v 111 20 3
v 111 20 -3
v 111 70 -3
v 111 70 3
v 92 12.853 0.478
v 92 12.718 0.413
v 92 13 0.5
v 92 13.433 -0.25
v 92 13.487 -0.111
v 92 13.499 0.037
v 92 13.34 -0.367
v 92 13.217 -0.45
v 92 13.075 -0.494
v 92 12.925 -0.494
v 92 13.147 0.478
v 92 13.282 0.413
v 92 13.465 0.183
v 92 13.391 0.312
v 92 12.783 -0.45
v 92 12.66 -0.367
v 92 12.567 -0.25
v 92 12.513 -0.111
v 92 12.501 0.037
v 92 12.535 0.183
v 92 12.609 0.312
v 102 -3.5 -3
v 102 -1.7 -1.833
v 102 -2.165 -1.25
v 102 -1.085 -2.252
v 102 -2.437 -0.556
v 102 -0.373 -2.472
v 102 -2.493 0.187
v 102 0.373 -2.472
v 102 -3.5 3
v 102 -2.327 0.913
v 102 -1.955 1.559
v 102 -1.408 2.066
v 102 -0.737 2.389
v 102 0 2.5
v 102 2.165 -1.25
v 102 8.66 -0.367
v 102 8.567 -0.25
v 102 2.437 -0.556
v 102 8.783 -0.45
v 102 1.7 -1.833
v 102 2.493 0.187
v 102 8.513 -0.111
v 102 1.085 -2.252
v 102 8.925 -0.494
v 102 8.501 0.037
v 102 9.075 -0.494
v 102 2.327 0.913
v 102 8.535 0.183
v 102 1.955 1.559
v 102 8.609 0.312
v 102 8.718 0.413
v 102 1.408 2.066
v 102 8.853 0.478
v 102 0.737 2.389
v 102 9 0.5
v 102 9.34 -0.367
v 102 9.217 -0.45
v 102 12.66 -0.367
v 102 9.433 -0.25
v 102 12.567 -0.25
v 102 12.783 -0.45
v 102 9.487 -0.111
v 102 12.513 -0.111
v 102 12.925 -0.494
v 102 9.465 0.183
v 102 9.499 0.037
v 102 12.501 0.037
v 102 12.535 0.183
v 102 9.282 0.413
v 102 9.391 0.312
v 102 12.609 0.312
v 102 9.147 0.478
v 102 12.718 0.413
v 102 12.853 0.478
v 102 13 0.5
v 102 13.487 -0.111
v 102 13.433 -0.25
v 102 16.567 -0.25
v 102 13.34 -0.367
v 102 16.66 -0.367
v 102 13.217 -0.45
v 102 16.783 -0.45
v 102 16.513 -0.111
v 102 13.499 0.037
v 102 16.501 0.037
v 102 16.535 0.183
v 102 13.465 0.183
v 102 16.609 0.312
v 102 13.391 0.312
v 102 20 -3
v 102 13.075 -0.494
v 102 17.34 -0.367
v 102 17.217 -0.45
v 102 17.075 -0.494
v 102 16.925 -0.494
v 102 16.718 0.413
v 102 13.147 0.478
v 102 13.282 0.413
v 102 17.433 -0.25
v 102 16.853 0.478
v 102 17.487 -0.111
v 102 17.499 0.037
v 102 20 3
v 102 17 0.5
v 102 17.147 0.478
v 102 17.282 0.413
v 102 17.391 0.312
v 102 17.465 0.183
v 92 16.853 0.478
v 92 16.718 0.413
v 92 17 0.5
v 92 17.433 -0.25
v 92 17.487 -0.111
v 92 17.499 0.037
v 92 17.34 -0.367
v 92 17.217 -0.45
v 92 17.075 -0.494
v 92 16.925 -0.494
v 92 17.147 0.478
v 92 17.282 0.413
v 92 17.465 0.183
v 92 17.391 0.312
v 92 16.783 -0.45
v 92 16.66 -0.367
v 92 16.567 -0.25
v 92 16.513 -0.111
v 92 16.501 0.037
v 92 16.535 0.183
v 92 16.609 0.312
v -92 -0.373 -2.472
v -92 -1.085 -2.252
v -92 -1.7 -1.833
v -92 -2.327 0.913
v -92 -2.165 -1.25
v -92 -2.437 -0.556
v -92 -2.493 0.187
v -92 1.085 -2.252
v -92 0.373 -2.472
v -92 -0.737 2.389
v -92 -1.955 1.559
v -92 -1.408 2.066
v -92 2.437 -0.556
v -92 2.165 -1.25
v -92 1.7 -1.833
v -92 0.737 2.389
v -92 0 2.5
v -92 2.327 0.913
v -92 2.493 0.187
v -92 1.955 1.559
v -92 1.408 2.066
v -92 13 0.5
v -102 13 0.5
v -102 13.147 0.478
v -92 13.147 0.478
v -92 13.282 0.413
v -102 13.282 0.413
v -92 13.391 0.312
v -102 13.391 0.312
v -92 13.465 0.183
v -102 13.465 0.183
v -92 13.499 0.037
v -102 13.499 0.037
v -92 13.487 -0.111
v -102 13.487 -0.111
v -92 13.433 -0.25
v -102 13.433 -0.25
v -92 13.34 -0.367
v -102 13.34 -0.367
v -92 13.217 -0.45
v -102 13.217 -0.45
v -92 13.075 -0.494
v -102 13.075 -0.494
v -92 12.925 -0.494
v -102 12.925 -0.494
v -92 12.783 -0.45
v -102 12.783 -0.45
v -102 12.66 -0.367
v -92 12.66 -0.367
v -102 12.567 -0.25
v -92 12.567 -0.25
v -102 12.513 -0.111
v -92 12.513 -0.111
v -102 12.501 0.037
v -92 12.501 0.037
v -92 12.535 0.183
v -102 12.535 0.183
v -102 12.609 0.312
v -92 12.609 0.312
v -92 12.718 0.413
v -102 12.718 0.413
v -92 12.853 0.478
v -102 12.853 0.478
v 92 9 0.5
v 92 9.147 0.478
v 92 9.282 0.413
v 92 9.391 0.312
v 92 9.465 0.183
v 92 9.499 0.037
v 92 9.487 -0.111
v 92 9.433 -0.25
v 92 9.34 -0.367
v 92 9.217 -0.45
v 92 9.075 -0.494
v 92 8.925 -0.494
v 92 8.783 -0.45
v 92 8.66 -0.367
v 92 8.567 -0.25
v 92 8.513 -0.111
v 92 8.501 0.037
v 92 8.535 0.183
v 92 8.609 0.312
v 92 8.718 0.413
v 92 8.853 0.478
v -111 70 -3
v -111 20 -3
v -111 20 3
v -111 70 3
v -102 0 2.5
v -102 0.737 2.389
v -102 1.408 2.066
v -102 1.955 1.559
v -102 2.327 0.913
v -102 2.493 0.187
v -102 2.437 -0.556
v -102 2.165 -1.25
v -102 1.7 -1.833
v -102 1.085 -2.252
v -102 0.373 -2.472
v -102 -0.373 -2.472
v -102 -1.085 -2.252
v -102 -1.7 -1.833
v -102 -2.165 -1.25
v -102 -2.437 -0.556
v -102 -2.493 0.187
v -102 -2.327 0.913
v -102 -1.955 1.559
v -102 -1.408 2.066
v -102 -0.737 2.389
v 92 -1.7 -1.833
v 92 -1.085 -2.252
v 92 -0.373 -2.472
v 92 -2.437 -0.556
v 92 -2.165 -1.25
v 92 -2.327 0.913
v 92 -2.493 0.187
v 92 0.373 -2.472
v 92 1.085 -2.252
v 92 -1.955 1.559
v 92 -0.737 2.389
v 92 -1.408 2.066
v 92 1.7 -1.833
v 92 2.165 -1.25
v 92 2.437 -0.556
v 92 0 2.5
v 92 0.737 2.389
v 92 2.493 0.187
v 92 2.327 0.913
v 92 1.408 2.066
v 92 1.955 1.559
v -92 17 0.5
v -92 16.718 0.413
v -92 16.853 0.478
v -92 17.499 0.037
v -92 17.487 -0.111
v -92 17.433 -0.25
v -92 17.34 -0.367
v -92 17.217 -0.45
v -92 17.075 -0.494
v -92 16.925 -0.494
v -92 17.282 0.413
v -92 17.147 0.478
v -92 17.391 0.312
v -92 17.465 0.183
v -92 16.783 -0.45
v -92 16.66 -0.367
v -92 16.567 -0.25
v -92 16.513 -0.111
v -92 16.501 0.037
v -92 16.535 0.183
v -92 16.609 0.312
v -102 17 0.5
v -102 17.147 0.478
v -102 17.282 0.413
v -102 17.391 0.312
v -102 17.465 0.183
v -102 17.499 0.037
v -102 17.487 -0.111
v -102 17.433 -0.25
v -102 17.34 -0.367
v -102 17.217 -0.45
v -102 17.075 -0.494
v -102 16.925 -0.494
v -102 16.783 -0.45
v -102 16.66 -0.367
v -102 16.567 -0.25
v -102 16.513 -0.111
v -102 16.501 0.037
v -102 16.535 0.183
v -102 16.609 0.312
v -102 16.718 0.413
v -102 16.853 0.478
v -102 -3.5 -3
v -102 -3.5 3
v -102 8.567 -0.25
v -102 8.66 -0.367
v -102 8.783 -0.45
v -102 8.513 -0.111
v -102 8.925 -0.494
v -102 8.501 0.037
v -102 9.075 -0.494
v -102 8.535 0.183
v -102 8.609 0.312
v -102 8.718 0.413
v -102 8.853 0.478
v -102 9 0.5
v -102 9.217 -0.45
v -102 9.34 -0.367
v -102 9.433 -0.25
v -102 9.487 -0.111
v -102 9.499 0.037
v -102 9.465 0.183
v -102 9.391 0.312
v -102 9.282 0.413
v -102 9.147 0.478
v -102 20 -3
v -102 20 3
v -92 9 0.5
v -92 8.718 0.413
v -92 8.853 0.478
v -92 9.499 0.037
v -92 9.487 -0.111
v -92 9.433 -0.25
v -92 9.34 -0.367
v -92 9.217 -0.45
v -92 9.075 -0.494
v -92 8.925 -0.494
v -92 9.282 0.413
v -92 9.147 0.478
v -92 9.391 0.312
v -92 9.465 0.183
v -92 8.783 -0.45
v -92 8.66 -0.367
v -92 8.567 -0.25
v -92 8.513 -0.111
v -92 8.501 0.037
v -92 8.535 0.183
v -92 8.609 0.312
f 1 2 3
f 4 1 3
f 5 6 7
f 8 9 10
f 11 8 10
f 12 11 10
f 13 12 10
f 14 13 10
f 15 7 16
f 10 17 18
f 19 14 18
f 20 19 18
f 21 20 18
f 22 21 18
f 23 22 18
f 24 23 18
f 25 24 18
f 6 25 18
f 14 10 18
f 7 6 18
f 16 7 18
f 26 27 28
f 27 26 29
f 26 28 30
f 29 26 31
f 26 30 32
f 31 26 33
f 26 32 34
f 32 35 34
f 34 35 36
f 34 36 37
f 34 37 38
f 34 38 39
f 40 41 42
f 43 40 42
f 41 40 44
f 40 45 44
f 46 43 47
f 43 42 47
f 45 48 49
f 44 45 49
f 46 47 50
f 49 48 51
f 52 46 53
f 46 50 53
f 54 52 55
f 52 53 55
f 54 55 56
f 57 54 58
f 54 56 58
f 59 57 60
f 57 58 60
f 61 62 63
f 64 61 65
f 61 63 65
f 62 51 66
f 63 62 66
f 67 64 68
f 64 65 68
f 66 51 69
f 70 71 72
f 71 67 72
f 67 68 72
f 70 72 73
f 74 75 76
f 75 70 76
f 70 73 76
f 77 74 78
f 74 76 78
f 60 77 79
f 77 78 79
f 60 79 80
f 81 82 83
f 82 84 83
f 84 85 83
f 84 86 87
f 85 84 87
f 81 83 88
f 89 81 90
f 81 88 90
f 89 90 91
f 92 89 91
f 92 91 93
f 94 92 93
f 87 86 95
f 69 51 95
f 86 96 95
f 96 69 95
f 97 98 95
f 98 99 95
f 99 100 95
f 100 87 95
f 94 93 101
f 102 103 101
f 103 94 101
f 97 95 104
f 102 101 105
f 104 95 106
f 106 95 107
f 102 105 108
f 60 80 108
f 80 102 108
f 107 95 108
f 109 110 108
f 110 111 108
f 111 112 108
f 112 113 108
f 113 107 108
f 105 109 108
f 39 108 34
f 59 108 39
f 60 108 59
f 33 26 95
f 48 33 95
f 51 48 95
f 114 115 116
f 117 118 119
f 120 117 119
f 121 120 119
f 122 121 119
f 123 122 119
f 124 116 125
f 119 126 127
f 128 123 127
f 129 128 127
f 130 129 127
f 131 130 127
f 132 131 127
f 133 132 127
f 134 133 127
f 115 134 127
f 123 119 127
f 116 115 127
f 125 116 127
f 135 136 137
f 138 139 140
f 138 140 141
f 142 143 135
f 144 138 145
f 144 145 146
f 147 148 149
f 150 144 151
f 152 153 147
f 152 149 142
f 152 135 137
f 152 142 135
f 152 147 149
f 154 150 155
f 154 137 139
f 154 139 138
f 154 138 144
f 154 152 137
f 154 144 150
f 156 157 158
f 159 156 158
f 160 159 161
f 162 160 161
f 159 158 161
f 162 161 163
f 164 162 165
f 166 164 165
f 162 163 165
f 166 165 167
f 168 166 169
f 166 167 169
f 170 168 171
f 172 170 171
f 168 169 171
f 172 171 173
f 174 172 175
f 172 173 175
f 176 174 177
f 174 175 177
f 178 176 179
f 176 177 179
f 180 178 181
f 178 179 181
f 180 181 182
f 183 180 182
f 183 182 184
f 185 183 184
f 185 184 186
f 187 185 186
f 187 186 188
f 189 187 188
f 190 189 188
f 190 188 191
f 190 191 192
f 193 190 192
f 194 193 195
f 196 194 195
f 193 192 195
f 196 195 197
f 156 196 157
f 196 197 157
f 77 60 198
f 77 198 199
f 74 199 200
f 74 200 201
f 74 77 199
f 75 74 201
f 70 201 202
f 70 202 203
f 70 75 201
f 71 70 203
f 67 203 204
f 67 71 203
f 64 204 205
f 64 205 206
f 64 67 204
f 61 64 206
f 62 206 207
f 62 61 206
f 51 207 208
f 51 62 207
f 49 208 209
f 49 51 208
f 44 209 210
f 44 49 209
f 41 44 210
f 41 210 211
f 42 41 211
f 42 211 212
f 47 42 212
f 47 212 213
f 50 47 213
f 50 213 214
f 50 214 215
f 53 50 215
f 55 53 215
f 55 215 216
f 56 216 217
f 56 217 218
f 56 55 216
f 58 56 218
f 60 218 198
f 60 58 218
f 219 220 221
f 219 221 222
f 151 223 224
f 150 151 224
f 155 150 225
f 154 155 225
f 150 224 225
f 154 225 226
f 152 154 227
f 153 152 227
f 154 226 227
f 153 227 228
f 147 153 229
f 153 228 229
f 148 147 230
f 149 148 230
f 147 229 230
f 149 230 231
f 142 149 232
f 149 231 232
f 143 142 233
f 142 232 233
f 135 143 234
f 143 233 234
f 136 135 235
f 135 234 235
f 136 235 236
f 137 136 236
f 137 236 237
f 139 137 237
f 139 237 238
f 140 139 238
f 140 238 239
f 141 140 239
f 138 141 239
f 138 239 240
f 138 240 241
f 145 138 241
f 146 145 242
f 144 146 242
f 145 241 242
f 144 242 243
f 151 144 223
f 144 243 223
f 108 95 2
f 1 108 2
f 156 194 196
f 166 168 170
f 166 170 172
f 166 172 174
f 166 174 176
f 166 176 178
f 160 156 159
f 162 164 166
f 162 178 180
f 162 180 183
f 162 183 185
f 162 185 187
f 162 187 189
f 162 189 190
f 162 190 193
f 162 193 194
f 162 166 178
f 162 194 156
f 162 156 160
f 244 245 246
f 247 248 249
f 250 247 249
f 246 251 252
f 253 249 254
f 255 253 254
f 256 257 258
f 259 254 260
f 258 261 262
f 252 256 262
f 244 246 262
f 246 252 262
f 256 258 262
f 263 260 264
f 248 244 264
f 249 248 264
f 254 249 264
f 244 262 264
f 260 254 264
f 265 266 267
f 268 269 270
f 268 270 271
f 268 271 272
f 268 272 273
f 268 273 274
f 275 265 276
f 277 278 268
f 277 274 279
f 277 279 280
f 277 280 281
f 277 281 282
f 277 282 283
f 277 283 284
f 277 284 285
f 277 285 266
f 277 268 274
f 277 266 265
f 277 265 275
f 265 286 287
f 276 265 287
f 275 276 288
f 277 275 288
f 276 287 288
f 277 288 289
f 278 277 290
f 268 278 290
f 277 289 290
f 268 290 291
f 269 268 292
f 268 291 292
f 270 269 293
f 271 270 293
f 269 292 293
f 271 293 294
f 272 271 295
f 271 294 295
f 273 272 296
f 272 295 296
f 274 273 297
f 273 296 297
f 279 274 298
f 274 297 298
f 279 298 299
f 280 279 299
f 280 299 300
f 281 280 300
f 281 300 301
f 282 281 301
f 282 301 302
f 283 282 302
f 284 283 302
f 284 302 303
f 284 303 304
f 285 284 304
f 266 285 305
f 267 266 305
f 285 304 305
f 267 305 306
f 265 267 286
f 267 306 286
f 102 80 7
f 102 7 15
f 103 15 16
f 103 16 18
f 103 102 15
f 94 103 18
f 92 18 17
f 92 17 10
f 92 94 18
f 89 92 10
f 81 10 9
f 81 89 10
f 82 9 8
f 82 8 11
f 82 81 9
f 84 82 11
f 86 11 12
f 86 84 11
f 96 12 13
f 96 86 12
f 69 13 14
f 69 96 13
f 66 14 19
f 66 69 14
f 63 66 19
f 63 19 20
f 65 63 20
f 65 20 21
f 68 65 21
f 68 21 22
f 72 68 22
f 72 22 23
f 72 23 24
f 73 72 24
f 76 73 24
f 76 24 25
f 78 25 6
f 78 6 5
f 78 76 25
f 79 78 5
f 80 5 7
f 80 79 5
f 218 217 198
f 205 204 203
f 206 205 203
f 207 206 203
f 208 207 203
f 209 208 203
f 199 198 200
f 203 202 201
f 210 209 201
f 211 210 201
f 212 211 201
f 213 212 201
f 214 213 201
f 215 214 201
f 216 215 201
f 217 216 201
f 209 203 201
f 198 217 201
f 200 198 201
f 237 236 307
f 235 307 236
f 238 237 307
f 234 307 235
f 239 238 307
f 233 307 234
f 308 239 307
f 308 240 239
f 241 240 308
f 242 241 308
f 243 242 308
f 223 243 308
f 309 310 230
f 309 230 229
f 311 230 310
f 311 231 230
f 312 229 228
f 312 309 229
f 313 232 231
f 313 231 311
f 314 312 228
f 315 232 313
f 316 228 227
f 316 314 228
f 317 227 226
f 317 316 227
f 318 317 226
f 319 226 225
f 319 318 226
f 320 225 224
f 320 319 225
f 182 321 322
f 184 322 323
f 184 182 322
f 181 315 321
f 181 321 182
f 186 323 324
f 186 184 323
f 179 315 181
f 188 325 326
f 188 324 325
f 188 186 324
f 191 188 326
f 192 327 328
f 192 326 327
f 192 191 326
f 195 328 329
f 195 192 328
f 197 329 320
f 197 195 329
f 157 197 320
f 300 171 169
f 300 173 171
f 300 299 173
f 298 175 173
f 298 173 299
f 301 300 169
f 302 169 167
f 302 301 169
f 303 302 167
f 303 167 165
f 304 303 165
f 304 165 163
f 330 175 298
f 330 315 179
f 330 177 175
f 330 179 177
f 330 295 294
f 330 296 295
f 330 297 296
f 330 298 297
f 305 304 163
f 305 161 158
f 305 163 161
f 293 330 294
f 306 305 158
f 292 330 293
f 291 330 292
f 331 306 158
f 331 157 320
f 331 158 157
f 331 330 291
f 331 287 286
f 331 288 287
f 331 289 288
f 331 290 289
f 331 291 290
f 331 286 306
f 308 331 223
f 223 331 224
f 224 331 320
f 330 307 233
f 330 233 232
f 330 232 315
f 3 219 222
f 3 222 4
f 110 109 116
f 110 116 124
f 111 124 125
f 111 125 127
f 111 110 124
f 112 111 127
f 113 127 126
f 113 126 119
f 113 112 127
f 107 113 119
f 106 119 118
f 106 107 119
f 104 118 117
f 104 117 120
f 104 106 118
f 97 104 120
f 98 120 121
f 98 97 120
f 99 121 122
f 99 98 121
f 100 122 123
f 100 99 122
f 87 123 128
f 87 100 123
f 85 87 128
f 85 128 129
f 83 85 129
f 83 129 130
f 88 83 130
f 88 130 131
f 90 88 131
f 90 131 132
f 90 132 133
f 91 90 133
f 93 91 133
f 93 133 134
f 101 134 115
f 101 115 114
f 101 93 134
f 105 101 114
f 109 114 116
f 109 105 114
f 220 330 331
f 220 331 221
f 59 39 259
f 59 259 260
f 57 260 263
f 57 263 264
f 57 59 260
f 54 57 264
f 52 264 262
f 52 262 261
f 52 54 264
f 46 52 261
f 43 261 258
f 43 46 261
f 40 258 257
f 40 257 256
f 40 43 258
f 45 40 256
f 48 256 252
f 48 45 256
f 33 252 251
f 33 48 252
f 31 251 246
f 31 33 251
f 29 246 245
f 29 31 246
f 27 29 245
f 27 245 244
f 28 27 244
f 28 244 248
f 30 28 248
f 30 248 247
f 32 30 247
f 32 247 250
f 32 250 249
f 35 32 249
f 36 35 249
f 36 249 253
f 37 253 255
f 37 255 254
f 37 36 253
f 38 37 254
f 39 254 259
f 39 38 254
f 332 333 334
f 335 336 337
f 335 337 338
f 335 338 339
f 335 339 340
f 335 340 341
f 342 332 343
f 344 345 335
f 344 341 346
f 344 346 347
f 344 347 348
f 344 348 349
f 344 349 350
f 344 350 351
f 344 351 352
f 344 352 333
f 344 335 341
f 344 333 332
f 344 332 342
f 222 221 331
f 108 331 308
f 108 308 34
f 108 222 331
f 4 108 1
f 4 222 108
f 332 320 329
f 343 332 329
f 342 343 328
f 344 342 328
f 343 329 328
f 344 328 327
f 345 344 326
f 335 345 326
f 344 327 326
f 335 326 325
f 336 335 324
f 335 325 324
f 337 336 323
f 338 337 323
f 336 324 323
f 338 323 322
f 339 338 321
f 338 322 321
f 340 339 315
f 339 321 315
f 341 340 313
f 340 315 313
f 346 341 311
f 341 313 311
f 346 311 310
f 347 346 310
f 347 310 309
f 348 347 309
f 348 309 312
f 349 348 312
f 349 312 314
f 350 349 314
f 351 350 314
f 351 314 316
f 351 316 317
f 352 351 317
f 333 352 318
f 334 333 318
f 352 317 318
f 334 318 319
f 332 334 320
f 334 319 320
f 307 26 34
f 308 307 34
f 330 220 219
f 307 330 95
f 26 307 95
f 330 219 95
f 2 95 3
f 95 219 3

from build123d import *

# Parameters (mm, degrees)
EXTRUDE_1_DEPTH     = 102
SKETCH_2_W          = 9
SKETCH_2_H          = 50
EXTRUDE_2_DEPTH     = 6
SKETCH_3_R          = 0.5
SKETCH_3_R_2        = 2.5
CUT_EXTRUDE_1_DEPTH = 10


with BuildPart() as part:
    # 草图1 → 凸台-拉伸1 (new, symmetric)
    with BuildSketch(Plane(origin=(0, 0, 0), x_dir=(0, 0, -1), z_dir=(1, 0, 0))):
        Polygon((-3, 0), (-3, 70), (3, 70), (3, 0), (3, -3.5), (-3, -3.5), align=None)
    extrude(amount=EXTRUDE_1_DEPTH, both=True)

    # 草图2 → 凸台-拉伸2 (add)
    with BuildSketch(Plane(origin=(0, 0, -3), x_dir=(-1, 0, 0), z_dir=(0, 0, -1))):
        with Locations((106.5, 45)):
            Rectangle(SKETCH_2_W, SKETCH_2_H)
    extrude_2 = extrude(amount=-EXTRUDE_2_DEPTH)

    # 草图3 → 切除-拉伸1 (cut)
    with BuildSketch(Plane.ZY.offset(102)):
        with Locations((0, 17)):
            Circle(SKETCH_3_R)
        Circle(SKETCH_3_R_2)
        with Locations((0, 13)):
            Circle(SKETCH_3_R)
        with Locations((0, 9)):
            Circle(SKETCH_3_R)
    cut_extrude_1 = extrude(amount=-CUT_EXTRUDE_1_DEPTH, mode=Mode.SUBTRACT)

    # 镜向1: 凸台-拉伸2, 切除-拉伸1 across plane
    add(extrude_2.mirror(Plane(origin=(0, 0, 0), x_dir=(0, 0, 1), z_dir=(1, 0, 0))))
    add(cut_extrude_1.mirror(Plane(origin=(0, 0, 0), x_dir=(0, 0, 1), z_dir=(1, 0, 0))), mode=Mode.SUBTRACT)


solid = part.part
